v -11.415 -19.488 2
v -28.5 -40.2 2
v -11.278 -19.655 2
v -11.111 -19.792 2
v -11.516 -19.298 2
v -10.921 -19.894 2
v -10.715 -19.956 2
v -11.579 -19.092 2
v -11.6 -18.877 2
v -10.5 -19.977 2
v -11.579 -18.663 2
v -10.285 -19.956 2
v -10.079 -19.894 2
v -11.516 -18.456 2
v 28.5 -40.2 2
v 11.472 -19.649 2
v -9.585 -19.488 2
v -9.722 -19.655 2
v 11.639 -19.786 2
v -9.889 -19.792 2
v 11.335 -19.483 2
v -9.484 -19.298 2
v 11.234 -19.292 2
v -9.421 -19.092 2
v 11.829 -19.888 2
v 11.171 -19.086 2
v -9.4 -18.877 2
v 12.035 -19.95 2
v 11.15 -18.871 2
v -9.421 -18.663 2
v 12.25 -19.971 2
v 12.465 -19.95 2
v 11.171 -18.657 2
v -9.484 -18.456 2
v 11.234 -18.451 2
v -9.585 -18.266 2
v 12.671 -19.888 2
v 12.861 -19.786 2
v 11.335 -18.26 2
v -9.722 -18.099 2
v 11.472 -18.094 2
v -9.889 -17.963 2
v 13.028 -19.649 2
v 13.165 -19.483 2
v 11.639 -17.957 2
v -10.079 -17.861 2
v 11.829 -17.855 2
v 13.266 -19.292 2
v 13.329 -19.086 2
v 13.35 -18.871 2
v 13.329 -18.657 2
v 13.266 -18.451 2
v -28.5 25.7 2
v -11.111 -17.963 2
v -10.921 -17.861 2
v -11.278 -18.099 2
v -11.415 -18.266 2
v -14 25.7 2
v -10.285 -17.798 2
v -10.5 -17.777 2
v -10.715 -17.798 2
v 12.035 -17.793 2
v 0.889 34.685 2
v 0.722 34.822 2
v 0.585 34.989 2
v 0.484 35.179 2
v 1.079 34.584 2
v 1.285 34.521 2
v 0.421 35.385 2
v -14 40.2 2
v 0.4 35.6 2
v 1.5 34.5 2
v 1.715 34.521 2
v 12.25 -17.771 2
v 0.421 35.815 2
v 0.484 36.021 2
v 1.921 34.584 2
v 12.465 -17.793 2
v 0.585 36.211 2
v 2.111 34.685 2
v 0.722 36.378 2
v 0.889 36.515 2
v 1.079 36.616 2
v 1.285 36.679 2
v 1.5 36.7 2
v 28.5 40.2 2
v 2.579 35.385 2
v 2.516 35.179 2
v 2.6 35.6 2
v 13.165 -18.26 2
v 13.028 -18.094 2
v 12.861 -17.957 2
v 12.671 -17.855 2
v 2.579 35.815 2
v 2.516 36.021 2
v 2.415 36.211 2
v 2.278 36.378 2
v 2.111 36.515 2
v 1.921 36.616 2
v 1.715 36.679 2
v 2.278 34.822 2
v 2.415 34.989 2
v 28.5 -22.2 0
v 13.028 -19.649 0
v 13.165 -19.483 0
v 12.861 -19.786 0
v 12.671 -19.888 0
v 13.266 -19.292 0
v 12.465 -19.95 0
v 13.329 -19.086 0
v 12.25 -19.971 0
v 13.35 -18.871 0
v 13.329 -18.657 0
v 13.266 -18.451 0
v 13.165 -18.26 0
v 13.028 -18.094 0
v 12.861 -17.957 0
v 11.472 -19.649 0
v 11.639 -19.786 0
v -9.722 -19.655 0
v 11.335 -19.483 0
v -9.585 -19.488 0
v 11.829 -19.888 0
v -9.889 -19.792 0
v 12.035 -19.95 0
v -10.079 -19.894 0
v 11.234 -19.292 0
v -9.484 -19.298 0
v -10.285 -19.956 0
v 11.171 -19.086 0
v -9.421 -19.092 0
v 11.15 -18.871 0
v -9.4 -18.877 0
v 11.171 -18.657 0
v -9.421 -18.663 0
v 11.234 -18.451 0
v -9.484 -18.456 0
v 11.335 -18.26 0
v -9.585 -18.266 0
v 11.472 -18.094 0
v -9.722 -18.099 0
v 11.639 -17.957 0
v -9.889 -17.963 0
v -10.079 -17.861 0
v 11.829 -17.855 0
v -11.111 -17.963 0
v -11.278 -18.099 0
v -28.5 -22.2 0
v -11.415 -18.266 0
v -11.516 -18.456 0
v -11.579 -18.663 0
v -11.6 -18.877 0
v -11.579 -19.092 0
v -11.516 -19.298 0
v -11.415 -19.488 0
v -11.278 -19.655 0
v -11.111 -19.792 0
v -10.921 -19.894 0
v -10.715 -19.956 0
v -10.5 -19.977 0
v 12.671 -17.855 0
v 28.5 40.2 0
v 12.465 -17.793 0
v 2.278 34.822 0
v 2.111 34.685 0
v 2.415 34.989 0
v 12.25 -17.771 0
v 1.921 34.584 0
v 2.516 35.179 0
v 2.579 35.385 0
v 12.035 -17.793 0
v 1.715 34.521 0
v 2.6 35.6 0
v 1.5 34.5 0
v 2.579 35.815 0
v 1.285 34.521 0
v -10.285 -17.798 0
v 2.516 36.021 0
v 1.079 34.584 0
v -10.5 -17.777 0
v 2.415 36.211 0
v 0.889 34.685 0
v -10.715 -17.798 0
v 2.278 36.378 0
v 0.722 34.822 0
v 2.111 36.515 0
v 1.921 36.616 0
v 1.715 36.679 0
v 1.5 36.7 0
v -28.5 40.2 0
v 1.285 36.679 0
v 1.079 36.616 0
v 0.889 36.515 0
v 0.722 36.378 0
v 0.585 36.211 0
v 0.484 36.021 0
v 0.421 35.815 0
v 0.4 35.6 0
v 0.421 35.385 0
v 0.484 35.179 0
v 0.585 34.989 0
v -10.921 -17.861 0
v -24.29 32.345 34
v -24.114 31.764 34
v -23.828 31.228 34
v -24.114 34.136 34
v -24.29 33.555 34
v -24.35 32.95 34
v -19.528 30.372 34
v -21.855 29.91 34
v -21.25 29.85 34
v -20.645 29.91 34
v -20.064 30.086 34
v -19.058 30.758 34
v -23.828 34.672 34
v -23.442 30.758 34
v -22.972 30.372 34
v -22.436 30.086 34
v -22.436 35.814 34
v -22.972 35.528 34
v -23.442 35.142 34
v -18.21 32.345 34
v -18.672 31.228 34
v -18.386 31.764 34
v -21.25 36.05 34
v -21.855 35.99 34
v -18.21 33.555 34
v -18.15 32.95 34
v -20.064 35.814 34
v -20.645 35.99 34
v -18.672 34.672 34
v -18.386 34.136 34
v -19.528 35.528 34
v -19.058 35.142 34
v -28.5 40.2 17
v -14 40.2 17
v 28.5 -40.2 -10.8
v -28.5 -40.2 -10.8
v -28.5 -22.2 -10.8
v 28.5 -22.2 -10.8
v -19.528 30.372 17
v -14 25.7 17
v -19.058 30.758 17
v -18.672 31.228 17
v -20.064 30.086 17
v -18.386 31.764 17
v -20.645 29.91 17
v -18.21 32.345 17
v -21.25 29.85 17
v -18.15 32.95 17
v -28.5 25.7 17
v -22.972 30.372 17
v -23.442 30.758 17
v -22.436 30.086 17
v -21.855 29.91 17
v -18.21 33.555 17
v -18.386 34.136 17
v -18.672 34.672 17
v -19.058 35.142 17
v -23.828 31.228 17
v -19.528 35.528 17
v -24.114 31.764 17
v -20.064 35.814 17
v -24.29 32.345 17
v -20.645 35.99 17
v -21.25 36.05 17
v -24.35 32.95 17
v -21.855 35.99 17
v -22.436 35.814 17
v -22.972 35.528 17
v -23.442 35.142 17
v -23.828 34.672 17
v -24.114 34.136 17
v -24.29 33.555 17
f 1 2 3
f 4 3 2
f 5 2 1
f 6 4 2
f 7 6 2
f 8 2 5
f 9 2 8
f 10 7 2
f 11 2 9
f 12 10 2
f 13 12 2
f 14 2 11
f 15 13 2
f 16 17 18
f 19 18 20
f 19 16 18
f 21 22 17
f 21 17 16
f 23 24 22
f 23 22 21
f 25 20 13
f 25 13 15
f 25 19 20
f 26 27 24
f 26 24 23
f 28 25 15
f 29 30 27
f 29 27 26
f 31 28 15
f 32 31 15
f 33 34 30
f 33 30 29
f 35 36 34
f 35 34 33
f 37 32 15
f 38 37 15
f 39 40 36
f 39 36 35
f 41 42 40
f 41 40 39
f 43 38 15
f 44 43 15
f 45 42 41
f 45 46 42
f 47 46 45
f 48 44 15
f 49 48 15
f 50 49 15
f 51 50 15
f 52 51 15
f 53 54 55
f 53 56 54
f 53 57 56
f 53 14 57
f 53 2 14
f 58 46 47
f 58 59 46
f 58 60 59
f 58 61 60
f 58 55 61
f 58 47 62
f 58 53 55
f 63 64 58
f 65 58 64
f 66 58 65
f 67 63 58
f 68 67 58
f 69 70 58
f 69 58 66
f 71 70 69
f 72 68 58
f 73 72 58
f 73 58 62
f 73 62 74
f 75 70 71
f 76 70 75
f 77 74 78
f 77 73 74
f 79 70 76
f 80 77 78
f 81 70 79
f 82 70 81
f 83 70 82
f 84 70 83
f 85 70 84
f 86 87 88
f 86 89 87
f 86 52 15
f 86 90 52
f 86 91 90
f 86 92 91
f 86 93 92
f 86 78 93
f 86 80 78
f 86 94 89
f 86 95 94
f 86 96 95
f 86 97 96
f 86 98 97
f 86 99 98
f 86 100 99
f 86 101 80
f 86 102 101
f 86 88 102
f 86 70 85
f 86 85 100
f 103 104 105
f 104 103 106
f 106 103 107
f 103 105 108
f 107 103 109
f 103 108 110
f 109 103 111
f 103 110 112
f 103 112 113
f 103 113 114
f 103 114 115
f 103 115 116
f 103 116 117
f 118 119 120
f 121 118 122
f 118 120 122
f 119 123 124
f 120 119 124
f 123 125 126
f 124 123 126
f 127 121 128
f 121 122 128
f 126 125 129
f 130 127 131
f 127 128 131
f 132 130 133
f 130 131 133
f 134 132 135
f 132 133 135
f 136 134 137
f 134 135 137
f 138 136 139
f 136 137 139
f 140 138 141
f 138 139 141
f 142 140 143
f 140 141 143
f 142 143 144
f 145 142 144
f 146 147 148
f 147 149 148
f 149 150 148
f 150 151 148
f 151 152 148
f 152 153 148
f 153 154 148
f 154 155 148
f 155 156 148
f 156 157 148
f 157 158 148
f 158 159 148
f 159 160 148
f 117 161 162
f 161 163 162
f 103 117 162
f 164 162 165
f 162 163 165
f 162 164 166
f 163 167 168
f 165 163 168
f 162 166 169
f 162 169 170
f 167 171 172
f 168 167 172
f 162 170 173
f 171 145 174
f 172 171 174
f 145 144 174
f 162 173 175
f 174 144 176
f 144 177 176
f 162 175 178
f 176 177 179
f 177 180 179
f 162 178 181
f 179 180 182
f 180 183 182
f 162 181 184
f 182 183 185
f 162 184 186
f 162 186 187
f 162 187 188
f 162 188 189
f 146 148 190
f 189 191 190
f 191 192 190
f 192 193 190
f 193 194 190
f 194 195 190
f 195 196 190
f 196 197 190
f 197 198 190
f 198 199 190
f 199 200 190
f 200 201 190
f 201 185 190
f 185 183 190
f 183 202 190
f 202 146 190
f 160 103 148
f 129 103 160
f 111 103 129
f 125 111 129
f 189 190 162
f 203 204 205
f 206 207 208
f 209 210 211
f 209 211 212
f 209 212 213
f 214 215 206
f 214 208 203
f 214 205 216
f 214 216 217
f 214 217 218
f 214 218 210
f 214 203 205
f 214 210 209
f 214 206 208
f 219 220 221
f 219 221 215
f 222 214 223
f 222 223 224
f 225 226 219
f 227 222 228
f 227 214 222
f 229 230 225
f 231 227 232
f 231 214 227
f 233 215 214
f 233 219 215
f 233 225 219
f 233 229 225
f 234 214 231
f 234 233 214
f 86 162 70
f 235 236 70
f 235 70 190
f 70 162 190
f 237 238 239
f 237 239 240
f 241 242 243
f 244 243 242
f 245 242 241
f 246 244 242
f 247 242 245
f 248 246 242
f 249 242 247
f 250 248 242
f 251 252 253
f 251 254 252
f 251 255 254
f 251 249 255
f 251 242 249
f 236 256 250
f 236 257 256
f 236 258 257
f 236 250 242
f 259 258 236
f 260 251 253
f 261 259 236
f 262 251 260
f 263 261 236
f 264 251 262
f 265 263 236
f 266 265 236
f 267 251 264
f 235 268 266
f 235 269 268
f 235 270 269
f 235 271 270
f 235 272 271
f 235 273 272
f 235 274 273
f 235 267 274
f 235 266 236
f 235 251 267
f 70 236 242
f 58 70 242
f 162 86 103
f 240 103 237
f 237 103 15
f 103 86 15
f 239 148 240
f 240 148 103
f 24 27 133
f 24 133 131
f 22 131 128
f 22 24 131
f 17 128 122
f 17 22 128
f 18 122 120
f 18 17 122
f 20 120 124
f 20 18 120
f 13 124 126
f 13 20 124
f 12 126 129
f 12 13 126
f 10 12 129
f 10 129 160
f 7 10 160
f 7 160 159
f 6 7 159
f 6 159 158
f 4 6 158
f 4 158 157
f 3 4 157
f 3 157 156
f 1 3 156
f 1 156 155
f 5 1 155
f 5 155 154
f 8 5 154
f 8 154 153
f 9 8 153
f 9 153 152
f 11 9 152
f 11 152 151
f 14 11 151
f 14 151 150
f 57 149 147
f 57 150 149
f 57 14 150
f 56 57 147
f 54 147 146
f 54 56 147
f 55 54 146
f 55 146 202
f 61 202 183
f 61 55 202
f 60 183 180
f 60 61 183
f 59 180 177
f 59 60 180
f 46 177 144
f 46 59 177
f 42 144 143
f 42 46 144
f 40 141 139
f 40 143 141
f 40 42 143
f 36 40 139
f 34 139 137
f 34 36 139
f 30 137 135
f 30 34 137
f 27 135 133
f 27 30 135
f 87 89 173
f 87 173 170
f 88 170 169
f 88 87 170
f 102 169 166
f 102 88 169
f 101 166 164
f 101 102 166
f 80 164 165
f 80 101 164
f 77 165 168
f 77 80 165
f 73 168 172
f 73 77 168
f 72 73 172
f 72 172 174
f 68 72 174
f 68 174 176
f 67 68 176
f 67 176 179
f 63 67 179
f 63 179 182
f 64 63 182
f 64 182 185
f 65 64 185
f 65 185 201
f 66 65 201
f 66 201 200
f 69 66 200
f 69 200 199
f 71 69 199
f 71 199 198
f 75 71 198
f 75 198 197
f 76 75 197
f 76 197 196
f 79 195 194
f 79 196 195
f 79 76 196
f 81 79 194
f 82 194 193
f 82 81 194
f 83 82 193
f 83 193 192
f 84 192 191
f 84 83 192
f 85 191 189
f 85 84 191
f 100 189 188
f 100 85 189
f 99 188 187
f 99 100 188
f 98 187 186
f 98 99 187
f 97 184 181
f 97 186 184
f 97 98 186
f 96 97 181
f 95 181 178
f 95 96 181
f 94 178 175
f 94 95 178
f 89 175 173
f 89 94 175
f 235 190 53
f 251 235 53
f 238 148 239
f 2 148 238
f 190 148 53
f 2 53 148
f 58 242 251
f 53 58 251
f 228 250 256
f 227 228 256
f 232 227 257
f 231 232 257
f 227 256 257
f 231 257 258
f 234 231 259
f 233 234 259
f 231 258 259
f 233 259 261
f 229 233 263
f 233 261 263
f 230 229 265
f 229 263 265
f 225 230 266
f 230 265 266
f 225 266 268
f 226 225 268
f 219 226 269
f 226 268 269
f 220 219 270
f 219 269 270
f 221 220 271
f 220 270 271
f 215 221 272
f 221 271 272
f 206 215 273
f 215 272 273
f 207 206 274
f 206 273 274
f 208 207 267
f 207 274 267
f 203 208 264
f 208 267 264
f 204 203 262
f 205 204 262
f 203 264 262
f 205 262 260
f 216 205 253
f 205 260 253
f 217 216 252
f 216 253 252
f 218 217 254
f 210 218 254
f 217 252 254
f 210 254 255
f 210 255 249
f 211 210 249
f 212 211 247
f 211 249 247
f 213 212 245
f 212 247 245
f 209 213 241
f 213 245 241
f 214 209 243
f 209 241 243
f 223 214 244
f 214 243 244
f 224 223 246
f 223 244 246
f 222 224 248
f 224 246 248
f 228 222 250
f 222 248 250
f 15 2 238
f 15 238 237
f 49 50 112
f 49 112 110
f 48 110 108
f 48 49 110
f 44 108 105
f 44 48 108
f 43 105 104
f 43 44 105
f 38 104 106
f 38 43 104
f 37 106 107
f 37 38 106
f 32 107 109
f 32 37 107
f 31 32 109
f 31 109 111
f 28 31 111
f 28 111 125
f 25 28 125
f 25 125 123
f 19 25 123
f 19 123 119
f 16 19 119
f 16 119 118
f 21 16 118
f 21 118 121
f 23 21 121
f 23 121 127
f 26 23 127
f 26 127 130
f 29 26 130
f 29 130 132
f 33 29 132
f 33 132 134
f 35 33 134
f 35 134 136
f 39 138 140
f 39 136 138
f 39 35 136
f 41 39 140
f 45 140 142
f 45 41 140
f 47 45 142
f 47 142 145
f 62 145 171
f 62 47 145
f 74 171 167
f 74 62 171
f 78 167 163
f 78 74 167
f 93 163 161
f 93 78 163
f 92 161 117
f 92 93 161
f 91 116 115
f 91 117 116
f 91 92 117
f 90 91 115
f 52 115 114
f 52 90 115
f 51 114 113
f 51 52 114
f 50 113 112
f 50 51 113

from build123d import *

# Parameters (mm, degrees)
SKETCH1_W               = 80.4
SKETCH1_H               = 57
BOSS_EXTRUDE1_DEPTH     = 17
SKETCH2_R               = 3.1
BOSS_EXTRUDE2_DEPTH     = 17
SKETCH3_W               = 57
SKETCH3_H               = 18
BOSS_EXTRUDE3_DEPTH     = 10.8
CUT_EXTRUDE1_DEPTH      = 15
CUT_EXTRUDE2_DEPTH      = 60.868940194
CUT_EXTRUDE2_DEPTH_BACK = 60.868940194
SKETCH5_R               = 1.1


with BuildPart() as part:
    # Sketch1 → Boss-Extrude1 (new body)
    with BuildSketch(Plane(origin=(0, 0, 0), x_dir=(0, 1, 0), z_dir=(0, 0, 1))):
        Rectangle(SKETCH1_W, SKETCH1_H)
    extrude(amount=BOSS_EXTRUDE1_DEPTH)

    # Sketch2 → Boss-Extrude2 (add)
    with BuildSketch(Plane.XY.offset(17)):
        with Locations((-21.25, 32.95)):
            Circle(SKETCH2_R)
    extrude(amount=BOSS_EXTRUDE2_DEPTH)

    # Sketch3 → Boss-Extrude3 (add)
    with BuildSketch(Plane(origin=(0, 0, 0), x_dir=(1, 0, 0), z_dir=(0, 0, -1))):
        with Locations((0, 31.2)):
            Rectangle(SKETCH3_W, SKETCH3_H)
    extrude(amount=BOSS_EXTRUDE3_DEPTH)

    # Sketch4 → Cut-Extrude1 (cut)
    with BuildSketch(Plane.XY.offset(17)):
        Polygon((-14, 40.2), (-14, 25.7), (-28.5, 25.7), (-28.5, -40.2), (28.5, -40.2), (28.5, 40.2), align=None)
    extrude(amount=-CUT_EXTRUDE1_DEPTH, mode=Mode.SUBTRACT)

    # Sketch5 → Cut-Extrude2 (cut, two sides: drawn at the far end of the back side and taken through both)
    with BuildSketch(Plane(origin=(0, 0, 0), x_dir=(1, 0, 0), z_dir=(0, 0, -1)).offset(-CUT_EXTRUDE2_DEPTH_BACK)):
        with Locations((1.5, -35.6)):
            Circle(SKETCH5_R)
        with Locations((-10.5, 18.877250546)):
            Circle(SKETCH5_R)
        with Locations((12.249999272, 18.87149398)):
            Circle(SKETCH5_R)
    extrude(amount=CUT_EXTRUDE2_DEPTH + CUT_EXTRUDE2_DEPTH_BACK, mode=Mode.SUBTRACT)


solid = part.part
